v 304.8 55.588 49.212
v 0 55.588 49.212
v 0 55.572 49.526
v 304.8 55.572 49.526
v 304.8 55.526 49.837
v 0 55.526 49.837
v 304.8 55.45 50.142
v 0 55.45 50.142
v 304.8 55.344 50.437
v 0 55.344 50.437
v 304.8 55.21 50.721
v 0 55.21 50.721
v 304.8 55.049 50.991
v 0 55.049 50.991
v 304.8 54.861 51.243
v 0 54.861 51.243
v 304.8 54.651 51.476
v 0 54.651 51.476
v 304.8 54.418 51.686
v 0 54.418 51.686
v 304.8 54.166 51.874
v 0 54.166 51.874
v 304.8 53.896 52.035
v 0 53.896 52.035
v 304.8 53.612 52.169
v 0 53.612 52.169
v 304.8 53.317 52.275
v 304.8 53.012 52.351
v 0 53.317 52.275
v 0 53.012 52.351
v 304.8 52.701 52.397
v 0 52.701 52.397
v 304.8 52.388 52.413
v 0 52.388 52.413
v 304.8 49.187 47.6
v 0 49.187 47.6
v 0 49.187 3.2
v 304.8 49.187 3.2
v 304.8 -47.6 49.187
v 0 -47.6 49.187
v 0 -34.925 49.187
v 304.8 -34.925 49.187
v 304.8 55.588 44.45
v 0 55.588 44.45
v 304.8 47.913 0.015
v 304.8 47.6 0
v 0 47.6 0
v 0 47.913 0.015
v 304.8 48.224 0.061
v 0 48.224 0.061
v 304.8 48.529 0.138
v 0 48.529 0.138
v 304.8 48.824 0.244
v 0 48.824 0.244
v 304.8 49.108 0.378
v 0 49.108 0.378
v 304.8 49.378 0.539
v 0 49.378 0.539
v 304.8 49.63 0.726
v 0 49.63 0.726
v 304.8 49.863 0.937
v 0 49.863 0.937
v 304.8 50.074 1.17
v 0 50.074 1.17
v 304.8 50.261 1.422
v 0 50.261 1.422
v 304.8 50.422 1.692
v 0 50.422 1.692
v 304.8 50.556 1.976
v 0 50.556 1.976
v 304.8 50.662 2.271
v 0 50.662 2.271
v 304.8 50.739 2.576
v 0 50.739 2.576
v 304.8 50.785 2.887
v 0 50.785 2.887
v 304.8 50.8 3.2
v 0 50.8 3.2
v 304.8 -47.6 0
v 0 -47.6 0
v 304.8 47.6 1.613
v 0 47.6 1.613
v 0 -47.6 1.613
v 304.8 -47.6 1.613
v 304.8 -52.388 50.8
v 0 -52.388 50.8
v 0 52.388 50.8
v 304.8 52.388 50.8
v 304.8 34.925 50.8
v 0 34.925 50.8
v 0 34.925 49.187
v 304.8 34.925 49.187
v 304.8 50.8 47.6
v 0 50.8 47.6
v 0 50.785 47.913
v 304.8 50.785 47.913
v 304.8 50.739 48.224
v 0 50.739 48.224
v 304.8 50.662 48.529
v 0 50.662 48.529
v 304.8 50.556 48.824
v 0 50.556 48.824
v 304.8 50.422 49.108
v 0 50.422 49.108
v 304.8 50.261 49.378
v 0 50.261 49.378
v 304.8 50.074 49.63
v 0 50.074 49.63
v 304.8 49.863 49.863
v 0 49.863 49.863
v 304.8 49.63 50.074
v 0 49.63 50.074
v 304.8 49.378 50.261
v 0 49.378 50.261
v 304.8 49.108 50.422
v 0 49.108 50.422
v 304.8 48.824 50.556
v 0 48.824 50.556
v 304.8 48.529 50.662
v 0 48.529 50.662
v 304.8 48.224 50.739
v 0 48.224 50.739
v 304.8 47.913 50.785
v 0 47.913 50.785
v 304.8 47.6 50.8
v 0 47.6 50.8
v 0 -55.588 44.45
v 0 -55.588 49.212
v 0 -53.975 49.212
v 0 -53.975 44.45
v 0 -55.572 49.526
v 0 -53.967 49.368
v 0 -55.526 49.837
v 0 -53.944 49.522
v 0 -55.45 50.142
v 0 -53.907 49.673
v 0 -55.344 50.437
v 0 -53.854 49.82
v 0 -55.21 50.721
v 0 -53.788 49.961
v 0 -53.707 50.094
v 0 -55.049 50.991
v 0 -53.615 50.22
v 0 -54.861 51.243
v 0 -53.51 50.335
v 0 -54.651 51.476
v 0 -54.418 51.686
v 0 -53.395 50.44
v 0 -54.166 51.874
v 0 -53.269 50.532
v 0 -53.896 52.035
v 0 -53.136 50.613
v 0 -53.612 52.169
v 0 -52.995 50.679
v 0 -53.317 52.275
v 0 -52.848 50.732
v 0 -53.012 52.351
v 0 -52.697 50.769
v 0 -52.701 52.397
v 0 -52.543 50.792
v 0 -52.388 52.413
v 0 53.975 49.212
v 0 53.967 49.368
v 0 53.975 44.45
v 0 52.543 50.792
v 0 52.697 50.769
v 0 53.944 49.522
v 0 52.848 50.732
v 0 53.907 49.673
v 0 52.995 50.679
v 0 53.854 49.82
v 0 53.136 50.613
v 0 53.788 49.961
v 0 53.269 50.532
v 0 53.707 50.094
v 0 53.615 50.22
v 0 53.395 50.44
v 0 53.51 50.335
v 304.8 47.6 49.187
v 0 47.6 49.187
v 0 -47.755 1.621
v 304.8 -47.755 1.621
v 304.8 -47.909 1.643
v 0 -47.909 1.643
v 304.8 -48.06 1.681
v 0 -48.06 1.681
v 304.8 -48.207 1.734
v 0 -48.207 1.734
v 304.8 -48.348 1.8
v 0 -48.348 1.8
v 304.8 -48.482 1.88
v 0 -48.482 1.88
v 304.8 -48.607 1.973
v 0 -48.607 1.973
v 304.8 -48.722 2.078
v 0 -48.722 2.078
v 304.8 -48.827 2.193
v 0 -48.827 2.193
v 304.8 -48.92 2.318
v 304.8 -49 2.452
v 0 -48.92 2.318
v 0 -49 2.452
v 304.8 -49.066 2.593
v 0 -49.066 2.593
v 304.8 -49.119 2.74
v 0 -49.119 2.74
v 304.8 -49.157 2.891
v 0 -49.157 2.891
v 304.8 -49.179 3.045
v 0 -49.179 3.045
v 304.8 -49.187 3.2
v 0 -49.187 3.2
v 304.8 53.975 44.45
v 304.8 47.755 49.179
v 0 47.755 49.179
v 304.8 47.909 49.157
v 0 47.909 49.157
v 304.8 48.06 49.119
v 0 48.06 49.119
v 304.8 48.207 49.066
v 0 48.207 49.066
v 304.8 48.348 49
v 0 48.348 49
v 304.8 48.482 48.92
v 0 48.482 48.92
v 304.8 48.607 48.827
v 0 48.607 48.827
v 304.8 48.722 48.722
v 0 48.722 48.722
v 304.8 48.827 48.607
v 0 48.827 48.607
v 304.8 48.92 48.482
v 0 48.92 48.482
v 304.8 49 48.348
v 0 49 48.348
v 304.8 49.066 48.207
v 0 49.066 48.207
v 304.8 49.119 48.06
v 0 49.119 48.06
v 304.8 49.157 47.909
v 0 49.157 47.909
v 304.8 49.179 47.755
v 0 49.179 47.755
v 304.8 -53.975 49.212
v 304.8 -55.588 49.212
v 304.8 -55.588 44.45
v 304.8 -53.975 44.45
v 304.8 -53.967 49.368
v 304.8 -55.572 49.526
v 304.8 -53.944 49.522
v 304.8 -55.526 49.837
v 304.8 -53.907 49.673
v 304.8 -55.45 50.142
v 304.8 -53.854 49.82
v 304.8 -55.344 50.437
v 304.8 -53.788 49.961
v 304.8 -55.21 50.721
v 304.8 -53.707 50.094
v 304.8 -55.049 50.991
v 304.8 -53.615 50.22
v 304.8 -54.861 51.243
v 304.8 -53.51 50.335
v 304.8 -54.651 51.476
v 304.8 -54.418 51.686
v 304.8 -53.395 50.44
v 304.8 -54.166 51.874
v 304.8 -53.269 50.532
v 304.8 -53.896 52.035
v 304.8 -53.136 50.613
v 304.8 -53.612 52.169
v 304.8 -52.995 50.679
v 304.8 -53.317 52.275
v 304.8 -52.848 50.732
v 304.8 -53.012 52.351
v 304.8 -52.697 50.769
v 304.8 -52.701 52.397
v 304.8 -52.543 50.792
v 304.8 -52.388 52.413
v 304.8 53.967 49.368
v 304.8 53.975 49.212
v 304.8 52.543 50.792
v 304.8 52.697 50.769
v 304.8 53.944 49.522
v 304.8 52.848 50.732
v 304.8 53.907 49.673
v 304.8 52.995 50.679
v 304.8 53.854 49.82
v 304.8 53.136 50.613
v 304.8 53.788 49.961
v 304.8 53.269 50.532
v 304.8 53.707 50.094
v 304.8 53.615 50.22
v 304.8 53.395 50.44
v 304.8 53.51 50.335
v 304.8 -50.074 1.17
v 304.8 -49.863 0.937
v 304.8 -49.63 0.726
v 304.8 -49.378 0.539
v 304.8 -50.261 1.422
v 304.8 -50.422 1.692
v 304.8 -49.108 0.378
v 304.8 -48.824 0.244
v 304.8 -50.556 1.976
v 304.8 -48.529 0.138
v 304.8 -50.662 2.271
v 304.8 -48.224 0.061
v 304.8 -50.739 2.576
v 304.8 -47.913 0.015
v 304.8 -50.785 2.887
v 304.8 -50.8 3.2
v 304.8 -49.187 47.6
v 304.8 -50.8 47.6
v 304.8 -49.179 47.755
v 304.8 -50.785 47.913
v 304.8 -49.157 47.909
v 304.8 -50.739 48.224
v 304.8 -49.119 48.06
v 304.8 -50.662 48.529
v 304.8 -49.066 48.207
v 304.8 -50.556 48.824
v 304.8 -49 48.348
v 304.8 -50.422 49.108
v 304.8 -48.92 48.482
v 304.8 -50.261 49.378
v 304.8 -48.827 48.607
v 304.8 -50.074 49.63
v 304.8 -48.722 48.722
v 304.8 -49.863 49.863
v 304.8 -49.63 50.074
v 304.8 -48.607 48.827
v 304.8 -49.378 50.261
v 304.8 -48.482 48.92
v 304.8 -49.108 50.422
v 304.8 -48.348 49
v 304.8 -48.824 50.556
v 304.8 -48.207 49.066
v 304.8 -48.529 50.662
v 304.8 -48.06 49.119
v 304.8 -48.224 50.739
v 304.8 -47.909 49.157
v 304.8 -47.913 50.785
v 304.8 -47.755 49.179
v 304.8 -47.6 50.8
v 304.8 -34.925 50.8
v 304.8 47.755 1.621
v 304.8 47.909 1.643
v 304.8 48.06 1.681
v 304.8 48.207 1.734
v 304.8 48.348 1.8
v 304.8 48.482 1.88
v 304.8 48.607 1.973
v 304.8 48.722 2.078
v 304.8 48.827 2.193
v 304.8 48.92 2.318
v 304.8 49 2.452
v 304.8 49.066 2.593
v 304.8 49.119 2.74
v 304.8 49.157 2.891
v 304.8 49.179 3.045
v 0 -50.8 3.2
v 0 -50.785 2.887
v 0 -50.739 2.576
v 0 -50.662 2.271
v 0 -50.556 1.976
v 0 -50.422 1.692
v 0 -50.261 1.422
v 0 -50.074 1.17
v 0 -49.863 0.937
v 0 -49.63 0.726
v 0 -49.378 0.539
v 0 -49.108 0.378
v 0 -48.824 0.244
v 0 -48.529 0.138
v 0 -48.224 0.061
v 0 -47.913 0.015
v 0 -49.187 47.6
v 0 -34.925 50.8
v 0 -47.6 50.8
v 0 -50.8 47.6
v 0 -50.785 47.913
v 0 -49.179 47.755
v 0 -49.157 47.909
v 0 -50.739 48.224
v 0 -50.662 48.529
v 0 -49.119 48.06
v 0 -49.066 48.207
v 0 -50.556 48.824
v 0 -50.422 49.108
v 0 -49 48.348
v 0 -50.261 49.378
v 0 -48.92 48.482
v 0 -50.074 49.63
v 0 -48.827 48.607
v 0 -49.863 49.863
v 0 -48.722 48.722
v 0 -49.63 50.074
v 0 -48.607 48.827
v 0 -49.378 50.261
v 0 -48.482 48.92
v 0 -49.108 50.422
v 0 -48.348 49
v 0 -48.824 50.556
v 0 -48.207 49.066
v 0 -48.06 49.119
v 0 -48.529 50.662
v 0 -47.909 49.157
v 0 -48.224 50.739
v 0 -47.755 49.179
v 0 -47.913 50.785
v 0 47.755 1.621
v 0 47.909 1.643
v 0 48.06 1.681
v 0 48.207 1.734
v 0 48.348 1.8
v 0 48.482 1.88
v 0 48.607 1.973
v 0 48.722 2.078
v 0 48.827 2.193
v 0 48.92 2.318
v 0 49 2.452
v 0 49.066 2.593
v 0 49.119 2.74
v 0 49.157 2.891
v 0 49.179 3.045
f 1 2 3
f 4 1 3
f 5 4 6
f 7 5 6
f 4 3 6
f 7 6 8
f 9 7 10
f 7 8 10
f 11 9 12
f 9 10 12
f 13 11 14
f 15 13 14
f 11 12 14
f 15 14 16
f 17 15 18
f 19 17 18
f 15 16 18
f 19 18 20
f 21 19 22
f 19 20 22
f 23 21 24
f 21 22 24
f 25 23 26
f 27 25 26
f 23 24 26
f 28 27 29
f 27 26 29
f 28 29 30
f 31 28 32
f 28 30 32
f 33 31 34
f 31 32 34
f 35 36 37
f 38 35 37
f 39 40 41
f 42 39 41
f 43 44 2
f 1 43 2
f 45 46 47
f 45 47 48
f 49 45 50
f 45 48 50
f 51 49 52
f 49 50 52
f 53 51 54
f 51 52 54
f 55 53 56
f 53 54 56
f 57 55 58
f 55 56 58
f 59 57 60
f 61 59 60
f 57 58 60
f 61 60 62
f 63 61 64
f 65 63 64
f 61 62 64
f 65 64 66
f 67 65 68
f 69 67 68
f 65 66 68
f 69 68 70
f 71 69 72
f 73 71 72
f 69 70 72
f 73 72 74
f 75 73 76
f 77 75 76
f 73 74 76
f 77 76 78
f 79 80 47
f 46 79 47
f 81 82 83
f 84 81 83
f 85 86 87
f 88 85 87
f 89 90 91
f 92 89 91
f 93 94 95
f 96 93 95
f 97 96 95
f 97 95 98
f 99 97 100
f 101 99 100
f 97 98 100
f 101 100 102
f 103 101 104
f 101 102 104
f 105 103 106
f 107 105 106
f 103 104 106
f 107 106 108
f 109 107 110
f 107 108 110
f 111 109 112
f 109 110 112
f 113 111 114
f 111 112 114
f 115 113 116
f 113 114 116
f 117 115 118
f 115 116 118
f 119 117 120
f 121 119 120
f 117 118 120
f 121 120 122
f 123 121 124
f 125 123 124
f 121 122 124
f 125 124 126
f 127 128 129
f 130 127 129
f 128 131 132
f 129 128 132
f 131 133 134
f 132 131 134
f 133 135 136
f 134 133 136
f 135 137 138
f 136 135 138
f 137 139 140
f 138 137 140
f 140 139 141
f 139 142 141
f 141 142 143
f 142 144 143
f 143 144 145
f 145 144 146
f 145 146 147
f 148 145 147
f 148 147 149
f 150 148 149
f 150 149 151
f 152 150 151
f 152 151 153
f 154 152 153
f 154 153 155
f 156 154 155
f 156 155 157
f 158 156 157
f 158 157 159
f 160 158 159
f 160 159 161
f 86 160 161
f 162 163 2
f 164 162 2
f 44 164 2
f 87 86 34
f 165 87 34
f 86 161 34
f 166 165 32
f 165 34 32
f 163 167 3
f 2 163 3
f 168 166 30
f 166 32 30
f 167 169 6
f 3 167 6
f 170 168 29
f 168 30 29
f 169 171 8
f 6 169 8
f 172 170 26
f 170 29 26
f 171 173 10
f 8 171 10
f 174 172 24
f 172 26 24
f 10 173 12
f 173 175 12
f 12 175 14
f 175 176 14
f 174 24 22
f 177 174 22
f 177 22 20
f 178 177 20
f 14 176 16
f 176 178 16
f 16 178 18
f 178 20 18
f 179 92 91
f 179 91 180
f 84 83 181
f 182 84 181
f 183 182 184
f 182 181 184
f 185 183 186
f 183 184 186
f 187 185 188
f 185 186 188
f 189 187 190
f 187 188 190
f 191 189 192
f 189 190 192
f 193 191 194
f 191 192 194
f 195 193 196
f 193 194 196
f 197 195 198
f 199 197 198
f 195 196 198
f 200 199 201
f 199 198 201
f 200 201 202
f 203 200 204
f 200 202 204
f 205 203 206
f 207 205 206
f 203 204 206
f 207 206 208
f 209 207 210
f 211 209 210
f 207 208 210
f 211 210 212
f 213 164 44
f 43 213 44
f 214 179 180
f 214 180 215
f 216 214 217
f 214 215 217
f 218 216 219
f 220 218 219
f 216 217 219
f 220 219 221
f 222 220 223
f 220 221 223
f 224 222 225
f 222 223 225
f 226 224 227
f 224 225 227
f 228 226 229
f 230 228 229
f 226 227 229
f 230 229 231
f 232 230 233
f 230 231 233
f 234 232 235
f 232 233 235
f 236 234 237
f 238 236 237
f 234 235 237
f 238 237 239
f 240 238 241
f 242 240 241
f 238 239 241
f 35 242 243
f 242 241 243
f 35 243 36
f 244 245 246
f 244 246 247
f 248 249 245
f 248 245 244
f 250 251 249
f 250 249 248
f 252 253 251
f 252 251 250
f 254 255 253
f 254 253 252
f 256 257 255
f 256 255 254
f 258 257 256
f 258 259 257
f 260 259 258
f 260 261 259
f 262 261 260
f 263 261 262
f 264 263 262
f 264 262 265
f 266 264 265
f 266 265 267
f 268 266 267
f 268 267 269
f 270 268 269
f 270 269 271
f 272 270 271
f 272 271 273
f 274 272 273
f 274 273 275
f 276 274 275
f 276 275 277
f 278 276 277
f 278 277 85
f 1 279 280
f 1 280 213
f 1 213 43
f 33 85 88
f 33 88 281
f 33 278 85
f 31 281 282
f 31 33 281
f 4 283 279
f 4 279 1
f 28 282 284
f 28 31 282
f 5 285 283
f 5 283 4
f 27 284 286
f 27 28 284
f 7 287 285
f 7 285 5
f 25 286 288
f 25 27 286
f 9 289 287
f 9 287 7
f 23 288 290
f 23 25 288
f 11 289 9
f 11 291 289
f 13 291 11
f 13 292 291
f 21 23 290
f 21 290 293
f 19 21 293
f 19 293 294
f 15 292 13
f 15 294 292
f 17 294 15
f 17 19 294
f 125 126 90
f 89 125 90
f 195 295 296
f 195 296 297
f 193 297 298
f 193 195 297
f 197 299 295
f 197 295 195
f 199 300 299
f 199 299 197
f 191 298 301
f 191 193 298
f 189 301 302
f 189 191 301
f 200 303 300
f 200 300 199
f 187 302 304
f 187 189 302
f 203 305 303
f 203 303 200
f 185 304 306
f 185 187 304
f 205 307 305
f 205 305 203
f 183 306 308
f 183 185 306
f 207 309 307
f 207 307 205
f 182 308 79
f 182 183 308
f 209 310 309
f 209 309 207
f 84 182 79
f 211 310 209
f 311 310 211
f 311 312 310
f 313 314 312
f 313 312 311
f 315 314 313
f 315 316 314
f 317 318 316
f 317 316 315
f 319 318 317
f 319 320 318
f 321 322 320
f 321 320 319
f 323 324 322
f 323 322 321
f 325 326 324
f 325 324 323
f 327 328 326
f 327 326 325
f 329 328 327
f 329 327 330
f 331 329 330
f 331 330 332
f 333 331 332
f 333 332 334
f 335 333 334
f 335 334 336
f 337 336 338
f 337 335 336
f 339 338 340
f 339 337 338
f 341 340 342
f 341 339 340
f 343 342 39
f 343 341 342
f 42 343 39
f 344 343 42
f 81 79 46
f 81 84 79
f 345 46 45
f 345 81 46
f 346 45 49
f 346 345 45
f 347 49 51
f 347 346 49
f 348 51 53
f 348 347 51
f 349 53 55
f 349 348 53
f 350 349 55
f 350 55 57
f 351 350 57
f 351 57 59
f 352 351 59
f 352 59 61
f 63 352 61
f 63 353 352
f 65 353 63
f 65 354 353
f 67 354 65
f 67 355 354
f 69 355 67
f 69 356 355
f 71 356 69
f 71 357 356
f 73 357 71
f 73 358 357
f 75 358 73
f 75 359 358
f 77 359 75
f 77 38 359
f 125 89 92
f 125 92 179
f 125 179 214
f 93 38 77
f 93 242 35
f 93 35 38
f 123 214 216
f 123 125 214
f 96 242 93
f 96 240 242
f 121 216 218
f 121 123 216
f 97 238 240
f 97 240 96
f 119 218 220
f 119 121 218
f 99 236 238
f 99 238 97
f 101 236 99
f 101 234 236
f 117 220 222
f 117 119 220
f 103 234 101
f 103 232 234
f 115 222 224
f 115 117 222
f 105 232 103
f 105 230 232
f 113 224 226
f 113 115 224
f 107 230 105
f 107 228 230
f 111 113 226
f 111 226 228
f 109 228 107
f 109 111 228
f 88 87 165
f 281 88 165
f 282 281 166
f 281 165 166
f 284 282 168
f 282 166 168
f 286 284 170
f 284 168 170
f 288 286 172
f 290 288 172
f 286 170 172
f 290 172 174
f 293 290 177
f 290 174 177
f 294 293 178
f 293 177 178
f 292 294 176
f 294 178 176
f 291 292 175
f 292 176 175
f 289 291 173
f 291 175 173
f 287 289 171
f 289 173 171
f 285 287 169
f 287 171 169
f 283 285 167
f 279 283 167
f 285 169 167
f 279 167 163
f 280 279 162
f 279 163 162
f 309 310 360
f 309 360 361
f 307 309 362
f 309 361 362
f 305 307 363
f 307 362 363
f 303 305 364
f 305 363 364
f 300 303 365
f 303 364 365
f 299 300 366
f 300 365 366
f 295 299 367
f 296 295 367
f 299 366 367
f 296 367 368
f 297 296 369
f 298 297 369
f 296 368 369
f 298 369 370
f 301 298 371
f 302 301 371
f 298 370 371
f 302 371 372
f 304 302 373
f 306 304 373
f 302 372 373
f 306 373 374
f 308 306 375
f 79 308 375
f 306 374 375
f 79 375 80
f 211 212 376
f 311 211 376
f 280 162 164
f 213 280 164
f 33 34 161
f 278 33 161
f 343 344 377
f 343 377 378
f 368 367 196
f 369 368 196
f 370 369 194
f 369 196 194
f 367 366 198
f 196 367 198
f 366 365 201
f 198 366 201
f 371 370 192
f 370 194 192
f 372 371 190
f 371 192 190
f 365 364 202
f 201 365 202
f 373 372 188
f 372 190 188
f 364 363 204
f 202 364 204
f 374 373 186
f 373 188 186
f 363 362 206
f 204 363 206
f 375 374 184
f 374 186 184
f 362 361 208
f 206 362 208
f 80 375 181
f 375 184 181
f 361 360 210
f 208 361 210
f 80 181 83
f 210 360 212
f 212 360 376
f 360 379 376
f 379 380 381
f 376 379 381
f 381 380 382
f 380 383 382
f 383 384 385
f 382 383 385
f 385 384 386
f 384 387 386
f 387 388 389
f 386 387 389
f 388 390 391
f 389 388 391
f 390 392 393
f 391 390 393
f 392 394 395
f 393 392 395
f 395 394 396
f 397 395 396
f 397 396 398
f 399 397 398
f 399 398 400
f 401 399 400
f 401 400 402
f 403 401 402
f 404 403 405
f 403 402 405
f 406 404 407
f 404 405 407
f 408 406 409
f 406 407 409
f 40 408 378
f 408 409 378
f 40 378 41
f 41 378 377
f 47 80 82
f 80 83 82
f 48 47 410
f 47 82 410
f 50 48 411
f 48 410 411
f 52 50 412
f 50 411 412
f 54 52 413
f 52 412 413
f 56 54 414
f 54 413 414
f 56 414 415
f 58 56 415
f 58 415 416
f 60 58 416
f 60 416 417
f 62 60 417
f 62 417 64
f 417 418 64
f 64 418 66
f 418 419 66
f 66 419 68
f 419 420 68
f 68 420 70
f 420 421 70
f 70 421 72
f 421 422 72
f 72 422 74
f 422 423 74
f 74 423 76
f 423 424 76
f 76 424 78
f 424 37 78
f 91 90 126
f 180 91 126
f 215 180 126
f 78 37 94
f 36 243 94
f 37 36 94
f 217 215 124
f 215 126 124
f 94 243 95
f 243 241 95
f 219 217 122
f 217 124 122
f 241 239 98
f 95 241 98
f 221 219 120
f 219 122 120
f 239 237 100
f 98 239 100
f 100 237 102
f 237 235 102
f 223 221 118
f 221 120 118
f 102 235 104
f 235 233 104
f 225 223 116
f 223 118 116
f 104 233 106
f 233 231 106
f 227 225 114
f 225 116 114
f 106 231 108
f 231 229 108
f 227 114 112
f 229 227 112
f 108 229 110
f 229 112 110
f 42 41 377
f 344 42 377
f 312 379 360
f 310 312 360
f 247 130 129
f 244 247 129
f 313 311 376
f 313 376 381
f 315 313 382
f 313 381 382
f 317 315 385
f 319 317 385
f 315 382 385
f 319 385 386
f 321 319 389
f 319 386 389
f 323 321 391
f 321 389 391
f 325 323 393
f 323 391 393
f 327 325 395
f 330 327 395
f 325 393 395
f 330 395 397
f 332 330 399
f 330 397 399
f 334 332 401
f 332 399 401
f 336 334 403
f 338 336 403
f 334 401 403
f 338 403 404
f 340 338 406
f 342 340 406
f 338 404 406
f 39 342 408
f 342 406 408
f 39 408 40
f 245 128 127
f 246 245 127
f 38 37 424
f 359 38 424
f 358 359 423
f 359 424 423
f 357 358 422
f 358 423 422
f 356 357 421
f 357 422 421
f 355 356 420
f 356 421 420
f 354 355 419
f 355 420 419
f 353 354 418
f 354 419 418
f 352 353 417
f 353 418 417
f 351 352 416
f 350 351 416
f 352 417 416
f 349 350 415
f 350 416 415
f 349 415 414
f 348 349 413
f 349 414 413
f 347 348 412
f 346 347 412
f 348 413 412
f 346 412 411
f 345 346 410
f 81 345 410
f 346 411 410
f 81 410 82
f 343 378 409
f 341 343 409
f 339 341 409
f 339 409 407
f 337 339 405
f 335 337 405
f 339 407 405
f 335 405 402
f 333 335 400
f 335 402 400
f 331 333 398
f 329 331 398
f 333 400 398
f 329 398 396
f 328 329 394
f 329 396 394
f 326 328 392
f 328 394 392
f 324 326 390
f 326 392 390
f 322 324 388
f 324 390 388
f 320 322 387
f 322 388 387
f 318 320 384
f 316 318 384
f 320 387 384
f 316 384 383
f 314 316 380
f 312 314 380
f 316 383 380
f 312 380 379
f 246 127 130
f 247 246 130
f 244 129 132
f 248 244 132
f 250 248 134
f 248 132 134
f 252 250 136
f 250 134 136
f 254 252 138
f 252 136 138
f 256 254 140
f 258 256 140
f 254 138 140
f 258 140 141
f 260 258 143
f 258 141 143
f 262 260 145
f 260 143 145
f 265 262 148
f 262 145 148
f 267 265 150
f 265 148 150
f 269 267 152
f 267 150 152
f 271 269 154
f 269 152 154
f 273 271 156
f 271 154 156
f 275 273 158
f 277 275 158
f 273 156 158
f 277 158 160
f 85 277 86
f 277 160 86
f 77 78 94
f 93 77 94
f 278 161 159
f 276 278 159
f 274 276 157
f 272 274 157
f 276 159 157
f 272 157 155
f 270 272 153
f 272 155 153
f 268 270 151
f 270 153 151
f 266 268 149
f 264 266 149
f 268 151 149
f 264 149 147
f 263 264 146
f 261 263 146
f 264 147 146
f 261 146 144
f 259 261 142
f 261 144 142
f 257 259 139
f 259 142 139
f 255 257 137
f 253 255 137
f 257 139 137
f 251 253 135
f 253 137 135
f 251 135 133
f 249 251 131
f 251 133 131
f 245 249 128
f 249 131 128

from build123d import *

# Parameters (mm, degrees)
F1_DEPTH = 304.8
F3_DEPTH = 304.8


with BuildPart() as f1:
    # F0 (on Right) → F1 (new body)
    with BuildSketch(Plane.YZ):
        with BuildLine():
            Line((-47.5996, 0), (0, 0))
            Line((0, 0), (47.5996, 0))
            ThreePointArc((47.5996, 0), (49.862625, 0.937375), (50.8, 3.2004))
            Line((50.8, 3.2004), (50.8, 47.5996))
            ThreePointArc((50.8, 47.5996), (49.862625, 49.862625), (47.5996, 50.8))
            Line((47.5996, 50.8), (34.925, 50.8))
            Line((34.925, 50.8), (34.925, 49.1871))
            Line((34.925, 49.1871), (47.5996, 49.1871))
            ThreePointArc((47.5996, 49.1871), (48.722132, 48.722132), (49.1871, 47.5996))
            Line((49.1871, 47.5996), (49.1871, 3.2004))
            ThreePointArc((49.1871, 3.2004), (48.722132, 2.077868), (47.5996, 1.6129))
            Line((47.5996, 1.6129), (0, 1.6129))
            Line((0, 1.6129), (-47.5996, 1.6129))
            ThreePointArc((-47.5996, 1.6129), (-48.722132, 2.077868), (-49.1871, 3.2004))
            Line((-49.1871, 3.2004), (-49.1871, 47.5996))
            ThreePointArc((-49.1871, 47.5996), (-48.722132, 48.722132), (-47.5996, 49.1871))
            Line((-47.5996, 49.1871), (-34.925, 49.1871))
            Line((-34.925, 49.1871), (-34.925, 50.8))
            Line((-34.925, 50.8), (-47.5996, 50.8))
            ThreePointArc((-47.5996, 50.8), (-49.862625, 49.862625), (-50.8, 47.5996))
            Line((-50.8, 47.5996), (-50.8, 3.2004))
            ThreePointArc((-50.8, 3.2004), (-49.862625, 0.937375), (-47.5996, 0))
        make_face()
    extrude(amount=F1_DEPTH)


with BuildPart() as f3:
    # F2 (on Right) → F3 (new body)
    with BuildSketch(Plane.YZ):
        with BuildLine():
            Line((-52.3875, 50.8), (0, 50.8))
            Line((0, 50.8), (52.3875, 50.8))
            ThreePointArc((52.3875, 50.8), (53.510032, 50.335032), (53.975, 49.2125))
            Line((53.975, 49.2125), (53.975, 44.45))
            Line((53.975, 44.45), (55.5879, 44.45))
            Line((55.5879, 44.45), (55.5879, 49.2125))
            ThreePointArc((55.5879, 49.2125), (54.650525, 51.475525), (52.3875, 52.4129))
            Line((52.3875, 52.4129), (0, 52.4129))
            Line((0, 52.4129), (-52.3875, 52.4129))
            ThreePointArc((-52.3875, 52.4129), (-54.650525, 51.475525), (-55.5879, 49.2125))
            Line((-55.5879, 49.2125), (-55.5879, 44.45))
            Line((-55.5879, 44.45), (-53.975, 44.45))
            Line((-53.975, 44.45), (-53.975, 49.2125))
            ThreePointArc((-53.975, 49.2125), (-53.510032, 50.335032), (-52.3875, 50.8))
        make_face()
    extrude(amount=F3_DEPTH)


solid = Compound([f1.part, f3.part])
